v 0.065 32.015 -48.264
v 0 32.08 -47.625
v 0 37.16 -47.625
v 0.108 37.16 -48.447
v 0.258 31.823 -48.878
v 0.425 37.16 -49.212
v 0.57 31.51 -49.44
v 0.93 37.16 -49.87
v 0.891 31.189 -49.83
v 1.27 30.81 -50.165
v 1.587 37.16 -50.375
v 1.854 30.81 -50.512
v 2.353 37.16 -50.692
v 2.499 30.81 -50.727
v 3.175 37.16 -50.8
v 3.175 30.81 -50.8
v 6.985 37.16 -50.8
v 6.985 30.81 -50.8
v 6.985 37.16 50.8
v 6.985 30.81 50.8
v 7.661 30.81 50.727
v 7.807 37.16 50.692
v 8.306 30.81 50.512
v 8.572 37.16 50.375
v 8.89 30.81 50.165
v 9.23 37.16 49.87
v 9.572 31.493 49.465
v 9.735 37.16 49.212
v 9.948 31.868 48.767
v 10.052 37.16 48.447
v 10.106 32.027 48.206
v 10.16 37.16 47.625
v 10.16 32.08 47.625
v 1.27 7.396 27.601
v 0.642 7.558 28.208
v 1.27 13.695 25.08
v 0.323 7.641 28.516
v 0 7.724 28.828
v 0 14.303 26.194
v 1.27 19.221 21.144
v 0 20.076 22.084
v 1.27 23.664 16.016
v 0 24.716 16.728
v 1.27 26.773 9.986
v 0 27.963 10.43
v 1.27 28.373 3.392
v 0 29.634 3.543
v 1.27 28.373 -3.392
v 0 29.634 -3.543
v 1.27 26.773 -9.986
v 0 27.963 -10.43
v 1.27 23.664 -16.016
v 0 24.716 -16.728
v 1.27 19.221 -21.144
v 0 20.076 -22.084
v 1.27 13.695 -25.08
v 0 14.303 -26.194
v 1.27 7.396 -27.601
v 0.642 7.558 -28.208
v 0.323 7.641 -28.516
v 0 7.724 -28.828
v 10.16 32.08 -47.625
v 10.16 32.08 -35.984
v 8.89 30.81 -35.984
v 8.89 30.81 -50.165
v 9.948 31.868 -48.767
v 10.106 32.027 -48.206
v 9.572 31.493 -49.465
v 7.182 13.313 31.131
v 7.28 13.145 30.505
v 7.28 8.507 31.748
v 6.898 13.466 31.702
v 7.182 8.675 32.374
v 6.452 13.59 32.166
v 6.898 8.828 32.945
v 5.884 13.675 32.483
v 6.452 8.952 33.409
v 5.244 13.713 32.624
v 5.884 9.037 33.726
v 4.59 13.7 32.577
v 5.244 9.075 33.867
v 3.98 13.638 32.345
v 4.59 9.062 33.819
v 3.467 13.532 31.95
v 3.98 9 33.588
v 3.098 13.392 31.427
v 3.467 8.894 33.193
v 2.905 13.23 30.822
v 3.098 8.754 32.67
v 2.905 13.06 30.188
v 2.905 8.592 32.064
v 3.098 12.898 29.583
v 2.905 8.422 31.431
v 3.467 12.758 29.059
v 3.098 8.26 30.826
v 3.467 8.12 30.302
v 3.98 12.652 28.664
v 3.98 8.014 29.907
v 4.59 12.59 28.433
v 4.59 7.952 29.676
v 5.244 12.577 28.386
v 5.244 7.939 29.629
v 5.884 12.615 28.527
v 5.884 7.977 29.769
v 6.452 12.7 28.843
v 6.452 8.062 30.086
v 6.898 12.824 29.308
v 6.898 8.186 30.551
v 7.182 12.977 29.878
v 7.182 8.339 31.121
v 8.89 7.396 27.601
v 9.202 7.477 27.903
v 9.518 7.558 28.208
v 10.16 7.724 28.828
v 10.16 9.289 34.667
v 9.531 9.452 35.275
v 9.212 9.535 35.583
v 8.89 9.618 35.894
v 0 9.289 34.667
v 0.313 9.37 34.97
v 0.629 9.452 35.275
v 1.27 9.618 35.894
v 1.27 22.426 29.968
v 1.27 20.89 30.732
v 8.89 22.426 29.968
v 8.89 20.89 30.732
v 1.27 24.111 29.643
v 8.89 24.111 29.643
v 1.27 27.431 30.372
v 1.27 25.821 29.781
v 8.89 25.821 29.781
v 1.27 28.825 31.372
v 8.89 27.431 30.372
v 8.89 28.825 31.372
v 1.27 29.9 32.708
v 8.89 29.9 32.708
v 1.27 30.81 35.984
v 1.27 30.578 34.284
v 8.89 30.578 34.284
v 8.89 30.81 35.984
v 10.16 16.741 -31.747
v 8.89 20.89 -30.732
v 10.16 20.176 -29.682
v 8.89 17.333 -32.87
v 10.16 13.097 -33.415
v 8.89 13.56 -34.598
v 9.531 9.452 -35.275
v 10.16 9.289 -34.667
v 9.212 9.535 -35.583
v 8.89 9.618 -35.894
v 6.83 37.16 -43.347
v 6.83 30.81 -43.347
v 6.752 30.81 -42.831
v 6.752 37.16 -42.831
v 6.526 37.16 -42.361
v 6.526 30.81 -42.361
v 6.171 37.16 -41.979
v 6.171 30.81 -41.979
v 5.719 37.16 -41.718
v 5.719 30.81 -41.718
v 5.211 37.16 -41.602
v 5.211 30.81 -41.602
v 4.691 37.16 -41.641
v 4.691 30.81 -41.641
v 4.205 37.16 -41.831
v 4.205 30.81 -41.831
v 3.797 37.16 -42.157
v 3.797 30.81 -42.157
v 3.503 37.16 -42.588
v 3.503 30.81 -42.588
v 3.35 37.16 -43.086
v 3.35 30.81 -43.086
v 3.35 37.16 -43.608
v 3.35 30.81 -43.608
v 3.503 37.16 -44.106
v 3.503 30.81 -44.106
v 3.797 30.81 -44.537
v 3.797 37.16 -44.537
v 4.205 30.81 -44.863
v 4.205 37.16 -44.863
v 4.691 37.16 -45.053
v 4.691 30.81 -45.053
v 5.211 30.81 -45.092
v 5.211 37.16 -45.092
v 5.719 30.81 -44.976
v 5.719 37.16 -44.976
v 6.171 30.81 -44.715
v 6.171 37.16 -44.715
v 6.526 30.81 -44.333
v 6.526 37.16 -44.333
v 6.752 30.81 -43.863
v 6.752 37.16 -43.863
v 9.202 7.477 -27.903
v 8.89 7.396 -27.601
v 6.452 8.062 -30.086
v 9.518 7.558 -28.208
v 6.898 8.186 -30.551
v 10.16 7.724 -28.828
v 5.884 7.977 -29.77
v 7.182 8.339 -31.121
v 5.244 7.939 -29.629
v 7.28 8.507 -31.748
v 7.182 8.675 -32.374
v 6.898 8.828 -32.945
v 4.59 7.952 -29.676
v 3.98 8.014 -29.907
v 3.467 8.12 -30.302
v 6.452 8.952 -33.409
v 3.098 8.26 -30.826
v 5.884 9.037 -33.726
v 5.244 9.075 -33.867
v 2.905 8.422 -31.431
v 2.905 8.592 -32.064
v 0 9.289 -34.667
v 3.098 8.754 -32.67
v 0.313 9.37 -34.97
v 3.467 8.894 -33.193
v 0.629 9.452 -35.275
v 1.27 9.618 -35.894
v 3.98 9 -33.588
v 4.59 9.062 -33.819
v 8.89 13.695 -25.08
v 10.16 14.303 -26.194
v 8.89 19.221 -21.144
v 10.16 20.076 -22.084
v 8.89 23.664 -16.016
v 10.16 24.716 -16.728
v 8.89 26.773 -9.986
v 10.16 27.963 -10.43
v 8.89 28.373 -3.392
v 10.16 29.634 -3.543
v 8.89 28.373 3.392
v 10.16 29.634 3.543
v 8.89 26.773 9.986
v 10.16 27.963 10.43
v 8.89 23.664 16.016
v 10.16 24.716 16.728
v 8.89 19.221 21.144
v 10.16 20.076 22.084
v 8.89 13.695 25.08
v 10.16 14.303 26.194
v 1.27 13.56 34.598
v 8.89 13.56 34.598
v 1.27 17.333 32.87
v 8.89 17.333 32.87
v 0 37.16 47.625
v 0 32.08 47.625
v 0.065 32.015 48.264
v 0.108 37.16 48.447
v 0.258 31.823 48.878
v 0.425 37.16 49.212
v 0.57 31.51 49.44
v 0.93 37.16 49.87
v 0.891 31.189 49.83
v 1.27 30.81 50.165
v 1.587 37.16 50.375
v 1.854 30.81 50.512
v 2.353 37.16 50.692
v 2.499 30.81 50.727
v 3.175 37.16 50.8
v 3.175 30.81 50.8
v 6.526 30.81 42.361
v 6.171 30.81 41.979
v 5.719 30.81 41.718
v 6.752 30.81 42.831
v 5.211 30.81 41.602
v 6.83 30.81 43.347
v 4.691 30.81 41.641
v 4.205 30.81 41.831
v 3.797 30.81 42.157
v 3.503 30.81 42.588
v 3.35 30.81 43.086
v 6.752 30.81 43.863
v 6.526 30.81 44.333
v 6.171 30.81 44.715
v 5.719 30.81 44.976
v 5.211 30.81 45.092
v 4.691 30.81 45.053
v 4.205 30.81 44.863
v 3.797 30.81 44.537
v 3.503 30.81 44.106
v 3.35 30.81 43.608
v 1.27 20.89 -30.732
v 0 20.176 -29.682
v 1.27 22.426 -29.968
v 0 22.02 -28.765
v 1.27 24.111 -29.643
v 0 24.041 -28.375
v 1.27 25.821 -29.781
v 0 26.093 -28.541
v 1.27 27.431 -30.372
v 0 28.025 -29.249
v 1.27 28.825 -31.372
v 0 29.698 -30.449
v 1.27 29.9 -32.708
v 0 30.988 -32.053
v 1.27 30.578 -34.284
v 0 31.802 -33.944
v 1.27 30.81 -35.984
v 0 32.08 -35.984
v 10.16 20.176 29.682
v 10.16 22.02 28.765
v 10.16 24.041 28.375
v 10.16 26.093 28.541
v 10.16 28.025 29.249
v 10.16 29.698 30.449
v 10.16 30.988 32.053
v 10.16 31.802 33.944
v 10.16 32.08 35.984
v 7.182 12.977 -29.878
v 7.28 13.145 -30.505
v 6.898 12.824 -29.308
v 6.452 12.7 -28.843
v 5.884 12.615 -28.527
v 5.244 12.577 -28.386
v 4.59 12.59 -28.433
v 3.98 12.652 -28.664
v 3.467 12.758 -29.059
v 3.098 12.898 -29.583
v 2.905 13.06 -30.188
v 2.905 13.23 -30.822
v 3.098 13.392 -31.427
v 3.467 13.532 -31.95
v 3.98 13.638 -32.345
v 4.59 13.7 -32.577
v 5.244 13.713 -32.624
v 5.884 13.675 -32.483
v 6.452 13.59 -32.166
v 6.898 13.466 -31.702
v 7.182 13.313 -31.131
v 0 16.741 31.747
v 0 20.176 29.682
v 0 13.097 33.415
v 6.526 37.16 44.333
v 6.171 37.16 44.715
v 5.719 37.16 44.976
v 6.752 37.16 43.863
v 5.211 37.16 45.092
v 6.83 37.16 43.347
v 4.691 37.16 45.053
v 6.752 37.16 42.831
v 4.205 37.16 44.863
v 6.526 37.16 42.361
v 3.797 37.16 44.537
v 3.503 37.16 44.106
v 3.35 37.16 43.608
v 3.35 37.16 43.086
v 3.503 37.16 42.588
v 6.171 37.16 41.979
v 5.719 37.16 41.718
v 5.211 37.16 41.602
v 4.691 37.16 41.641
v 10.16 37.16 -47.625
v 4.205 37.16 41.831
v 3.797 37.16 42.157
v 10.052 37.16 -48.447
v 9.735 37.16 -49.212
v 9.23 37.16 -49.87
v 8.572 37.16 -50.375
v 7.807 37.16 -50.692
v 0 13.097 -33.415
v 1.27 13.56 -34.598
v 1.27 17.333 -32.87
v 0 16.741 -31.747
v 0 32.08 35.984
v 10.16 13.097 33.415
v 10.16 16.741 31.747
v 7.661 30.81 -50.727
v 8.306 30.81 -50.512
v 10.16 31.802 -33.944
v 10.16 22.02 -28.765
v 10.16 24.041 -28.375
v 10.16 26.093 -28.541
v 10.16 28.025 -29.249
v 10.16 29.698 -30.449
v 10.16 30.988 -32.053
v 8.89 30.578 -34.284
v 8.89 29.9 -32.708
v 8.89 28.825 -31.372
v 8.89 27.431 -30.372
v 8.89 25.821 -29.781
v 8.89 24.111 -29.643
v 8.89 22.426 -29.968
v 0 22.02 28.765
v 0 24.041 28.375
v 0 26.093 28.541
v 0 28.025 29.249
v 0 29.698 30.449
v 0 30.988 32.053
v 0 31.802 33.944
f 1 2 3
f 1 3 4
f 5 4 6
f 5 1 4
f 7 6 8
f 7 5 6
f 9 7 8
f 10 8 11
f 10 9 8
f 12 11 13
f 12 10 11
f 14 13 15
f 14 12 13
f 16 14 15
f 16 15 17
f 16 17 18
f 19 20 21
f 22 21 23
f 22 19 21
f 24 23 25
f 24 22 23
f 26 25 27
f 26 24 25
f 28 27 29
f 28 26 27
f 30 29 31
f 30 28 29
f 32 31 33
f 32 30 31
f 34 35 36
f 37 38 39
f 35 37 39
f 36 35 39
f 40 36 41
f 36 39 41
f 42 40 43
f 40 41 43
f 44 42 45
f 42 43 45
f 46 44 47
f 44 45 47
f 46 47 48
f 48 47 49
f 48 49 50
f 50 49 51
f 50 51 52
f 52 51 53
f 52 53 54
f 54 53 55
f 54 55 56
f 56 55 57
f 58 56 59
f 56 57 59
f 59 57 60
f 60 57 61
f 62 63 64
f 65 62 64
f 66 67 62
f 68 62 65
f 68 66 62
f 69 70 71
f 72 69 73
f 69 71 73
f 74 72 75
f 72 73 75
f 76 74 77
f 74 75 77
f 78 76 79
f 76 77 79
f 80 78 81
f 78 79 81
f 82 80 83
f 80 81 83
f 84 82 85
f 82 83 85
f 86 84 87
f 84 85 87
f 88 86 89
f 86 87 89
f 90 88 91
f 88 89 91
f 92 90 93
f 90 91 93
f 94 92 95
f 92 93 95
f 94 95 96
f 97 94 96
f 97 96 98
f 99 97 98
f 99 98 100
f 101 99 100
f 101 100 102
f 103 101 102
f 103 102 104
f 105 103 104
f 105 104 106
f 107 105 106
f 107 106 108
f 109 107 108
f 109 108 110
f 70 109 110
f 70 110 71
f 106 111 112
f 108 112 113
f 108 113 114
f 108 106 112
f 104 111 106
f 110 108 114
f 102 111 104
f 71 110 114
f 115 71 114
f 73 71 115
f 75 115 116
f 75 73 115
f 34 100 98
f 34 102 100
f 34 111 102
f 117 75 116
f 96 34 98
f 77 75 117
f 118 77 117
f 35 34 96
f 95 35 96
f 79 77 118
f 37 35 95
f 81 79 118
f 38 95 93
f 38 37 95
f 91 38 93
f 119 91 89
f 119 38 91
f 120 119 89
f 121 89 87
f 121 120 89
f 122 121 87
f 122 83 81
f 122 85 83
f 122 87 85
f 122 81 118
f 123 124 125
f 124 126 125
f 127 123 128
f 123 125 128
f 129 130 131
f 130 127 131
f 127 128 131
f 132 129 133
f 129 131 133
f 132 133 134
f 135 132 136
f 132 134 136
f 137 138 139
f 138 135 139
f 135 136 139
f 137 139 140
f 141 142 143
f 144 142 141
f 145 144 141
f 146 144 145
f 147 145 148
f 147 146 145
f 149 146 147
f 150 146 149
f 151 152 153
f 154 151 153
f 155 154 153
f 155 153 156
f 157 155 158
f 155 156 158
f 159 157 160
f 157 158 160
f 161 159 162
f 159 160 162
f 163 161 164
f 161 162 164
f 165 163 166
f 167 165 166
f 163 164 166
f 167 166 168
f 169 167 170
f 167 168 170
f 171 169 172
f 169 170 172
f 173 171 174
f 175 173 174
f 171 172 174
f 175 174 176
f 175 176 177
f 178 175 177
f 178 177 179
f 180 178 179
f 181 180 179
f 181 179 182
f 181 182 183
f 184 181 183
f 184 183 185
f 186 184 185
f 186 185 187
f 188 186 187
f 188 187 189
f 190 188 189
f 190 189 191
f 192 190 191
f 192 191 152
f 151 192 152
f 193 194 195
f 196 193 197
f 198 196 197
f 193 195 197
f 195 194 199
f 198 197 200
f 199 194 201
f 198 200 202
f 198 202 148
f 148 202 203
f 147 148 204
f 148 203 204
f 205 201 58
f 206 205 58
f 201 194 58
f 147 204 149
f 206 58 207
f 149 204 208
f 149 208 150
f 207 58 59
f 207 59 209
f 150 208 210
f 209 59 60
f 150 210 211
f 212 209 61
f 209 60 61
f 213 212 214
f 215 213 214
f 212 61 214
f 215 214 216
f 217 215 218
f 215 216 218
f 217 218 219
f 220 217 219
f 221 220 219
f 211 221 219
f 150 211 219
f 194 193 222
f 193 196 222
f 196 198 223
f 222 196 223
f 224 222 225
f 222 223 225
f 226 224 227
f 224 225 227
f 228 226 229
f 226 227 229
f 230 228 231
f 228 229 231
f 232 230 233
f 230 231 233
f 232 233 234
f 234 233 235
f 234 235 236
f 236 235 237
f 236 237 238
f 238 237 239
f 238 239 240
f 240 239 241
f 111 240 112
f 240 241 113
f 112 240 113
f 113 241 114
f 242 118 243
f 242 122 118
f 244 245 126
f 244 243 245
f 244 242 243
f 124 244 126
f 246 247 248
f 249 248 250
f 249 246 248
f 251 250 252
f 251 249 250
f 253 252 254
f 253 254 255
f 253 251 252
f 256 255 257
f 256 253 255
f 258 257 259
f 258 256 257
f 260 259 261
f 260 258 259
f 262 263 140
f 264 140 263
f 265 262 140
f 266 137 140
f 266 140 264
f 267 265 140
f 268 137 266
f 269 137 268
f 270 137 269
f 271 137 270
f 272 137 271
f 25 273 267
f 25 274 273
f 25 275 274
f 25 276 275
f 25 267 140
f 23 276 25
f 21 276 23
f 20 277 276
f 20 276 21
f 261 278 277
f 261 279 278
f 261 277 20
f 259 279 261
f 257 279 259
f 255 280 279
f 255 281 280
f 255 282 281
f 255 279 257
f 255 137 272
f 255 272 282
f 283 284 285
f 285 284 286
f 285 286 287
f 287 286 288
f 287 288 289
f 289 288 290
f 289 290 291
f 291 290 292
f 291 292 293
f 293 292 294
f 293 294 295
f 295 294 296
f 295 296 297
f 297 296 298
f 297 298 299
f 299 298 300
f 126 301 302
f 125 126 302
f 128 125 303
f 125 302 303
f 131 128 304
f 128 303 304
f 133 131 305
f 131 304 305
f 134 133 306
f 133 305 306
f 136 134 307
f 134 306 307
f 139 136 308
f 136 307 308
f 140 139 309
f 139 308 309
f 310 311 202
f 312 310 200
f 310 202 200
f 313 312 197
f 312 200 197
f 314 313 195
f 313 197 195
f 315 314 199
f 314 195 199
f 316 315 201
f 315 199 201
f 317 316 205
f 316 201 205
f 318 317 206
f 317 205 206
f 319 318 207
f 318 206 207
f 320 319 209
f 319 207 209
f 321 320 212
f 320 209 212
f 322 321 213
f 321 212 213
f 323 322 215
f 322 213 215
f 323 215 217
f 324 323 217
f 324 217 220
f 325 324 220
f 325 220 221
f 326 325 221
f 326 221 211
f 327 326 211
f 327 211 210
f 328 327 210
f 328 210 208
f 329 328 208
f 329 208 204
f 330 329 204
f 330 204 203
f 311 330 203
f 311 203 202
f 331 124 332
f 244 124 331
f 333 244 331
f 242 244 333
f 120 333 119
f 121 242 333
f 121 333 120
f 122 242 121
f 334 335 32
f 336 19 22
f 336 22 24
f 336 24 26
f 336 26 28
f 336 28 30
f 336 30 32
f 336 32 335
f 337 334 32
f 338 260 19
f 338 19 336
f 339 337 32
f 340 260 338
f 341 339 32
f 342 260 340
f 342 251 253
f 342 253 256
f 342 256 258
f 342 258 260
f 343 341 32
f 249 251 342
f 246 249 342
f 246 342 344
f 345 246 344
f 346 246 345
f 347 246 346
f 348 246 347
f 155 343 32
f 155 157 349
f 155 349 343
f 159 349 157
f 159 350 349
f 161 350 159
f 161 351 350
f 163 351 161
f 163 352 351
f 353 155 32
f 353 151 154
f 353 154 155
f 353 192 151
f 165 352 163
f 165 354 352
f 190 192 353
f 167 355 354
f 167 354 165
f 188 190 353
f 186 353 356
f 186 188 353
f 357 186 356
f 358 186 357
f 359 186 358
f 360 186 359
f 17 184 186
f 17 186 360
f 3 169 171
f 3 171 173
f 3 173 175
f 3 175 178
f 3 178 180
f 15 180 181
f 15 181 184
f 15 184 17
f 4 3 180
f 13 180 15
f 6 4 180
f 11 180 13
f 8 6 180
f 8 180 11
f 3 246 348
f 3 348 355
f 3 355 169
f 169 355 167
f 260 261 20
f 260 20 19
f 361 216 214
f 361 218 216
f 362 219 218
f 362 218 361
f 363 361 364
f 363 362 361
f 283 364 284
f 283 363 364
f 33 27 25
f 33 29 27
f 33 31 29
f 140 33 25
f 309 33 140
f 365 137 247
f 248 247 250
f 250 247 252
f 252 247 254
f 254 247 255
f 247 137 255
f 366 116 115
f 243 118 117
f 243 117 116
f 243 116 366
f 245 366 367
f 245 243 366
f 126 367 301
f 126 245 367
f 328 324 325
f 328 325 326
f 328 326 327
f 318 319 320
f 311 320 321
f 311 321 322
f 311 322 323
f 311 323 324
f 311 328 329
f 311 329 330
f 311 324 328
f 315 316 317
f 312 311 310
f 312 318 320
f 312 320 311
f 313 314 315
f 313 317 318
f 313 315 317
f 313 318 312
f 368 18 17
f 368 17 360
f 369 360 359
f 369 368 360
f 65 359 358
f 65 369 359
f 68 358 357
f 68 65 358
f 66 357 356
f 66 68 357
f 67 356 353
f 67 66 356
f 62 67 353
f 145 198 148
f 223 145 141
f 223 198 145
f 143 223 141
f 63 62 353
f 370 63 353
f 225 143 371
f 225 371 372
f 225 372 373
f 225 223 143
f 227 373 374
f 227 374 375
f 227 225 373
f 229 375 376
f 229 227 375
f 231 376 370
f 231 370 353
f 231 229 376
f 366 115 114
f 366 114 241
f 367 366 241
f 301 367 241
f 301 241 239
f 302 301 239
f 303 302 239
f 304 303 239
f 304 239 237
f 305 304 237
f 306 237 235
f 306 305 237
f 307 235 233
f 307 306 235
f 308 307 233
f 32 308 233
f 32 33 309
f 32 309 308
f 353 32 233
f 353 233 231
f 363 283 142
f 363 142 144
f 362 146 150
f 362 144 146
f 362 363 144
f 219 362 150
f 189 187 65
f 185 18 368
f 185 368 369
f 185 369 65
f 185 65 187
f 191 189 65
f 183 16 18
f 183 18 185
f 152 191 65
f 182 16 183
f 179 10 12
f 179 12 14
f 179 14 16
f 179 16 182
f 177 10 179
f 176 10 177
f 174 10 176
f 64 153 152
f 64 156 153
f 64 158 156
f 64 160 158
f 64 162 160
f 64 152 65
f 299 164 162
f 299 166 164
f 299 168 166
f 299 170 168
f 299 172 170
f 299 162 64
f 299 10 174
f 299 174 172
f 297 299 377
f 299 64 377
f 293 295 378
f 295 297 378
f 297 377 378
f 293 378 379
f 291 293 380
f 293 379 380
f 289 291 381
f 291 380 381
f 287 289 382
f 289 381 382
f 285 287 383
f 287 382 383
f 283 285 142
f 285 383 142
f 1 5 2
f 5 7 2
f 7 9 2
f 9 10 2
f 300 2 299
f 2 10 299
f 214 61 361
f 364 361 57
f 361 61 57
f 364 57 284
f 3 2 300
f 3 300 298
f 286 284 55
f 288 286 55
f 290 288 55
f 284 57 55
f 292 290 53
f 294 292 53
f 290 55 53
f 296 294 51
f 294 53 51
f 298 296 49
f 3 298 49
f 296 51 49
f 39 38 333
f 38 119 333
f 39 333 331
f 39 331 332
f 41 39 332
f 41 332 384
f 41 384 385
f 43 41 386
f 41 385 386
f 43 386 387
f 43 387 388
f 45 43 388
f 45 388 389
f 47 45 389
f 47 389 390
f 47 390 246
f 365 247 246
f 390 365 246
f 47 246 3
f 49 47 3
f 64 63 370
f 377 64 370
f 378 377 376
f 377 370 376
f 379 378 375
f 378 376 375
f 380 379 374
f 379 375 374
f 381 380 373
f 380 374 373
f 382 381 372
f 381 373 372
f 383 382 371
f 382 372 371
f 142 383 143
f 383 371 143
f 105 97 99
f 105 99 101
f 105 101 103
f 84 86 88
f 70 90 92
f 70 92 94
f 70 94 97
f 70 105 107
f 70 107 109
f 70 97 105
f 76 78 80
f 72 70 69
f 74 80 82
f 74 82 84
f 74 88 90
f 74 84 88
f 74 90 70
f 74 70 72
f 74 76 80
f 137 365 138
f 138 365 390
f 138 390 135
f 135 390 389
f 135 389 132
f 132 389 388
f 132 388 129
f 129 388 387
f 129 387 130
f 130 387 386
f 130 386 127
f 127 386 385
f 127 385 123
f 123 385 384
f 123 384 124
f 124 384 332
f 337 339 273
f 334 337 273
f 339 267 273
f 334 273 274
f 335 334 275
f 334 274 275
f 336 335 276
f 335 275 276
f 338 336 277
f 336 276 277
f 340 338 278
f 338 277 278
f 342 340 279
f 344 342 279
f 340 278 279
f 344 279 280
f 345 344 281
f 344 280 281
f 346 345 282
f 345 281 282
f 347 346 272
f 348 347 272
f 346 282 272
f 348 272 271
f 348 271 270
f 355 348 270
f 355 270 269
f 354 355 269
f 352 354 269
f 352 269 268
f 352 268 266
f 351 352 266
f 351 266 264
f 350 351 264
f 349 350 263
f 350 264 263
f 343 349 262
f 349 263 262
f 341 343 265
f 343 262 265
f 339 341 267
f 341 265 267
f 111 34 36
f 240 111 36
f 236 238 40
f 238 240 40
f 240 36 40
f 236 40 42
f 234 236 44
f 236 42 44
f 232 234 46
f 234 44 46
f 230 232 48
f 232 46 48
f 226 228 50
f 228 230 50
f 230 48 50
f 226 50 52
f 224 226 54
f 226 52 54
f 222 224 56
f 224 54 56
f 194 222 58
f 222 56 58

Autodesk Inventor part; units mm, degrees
ref_plane "YZ Plane" through (0, 0, 0) normal (1, 0, 0) x (0, 1, 0)
ref_plane "XZ Plane" through (0, 0, 0) normal (0, 1, 0) x (-1, 0, 0)
ref_plane "XY Plane" through (0, 0, 0) normal (0, 0, 1) x (1, 0, 0)
sketch "Sketch1" plane through (0, 0, 0) normal (1, 0, 0) x (0, 1, 0)
  arc A0 (7.3958, -27.6013) -> (7.3958, 27.6013) centre (0, 0) ccw
  line L0 (7.3958, 27.6013) -> (9.6178, 35.894)
  line L1 (0, 0) -> (46.4224, 0) construction
  line L2 (7.3958, -27.6013) -> (9.6178, -35.894)
  line L3 (0, 0) -> (51.2466, 0) construction
  line L4 (30.8102, 20.7753) -> (30.8102, 50.8)
  line L5 (30.8102, 50.8) -> (37.1602, 50.8)
  line L6 (37.1602, 50.8) -> (37.1602, 0)
  line L7 (37.1602, 0) -> (37.1602, -50.8)
  line L8 (37.1602, -50.8) -> (30.8102, -50.8)
  line L9 (30.8102, -50.8) -> (30.8102, -20.7753)
  arc A1 (9.6178, -35.894) -> (30.8102, -20.7753) centre (0, 0) ccw
  arc A2 (30.8102, 20.7753) -> (9.6178, 35.894) centre (0, 0) ccw
extrude "Extrusion1" add sketch "Sketch1" along normal blind 10.16
sketch "Sketch2" plane through (0, 30.8102, 20.7753) normal (0, -1, 0) x (1, 0, 0)
  line L0 (0, 15.1187) -> (10.16, 15.1187)
  line L1 (10.16, -48.3766) -> (10.16, -56.6693) projected
  line L2 (10.16, 15.1187) -> (10.16, 6.8261) projected
  circle A0 centre (5.08, 22.5717) radius 1.75
  circle A1 centre (5.08, -64.1223) radius 1.75
  point P0 (0, -20.7753)
  point P1 (10.16, 30.0247)
  point P2 (0, 30.0247)
  point P3 (0, -71.5753)
  dimension "d10" = 3.5
  dimension "d11" = 3.5
extrude "Extrusion2" cut sketch "Sketch2" against normal blind 10.16
sketch "Sketch3" plane through (0, 7.3958, 27.6013) normal (0, -0.9659, 0.2588) x (1, 0, 0)
  circle A0 centre (5.08, 4.2926) radius 2.2
  point P0 (0, -28.575)
  point P1 (0, 8.5852)
  point P2 (10.16, 0)
  dimension "d16" = 4.4
extrude "Extrusion3" cut sketch "Sketch3" against normal blind 4.8
sketch "Sketch4" plane through (0, 9.6178, -35.894) normal (0, -0.9659, -0.2588) x (1, 0, 0)
  circle A0 centre (5.08, 4.2926) radius 2.2
  point P0 (0, 37.1602)
  point P1 (0, 0)
  point P2 (10.16, 8.5852)
extrude "Extrusion4" cut sketch "Sketch4" against normal blind 4.8
fillet "Fillet1" radius 6.35 2 edges at (5.08, 30.8102, -20.7753) (5.08, 30.8102, 20.7753)
chamfer "Chamfer2" distance 1.27 angle 45 10 edges at (10.16, 15.4709, 33.7866) (10.16, 30.8102, 43.3919) (0, 15.4709, 33.7866) (0, 30.8102, 43.3919) (0, 28.575, 0) (10.16, 28.575, 0) (10.16, 15.4709, -33.7866) (10.16, 30.8102, -43.3919) (0, 15.4709, -33.7866) (0, 30.8102, -43.3919)
fillet "Fillet2" radius 3.175 4 edges at (0, 34.6202, 50.8) (10.16, 34.6202, 50.8) (0, 34.6202, -50.8) (10.16, 34.6202, -50.8)
properties part number "bottomCameraMount"
